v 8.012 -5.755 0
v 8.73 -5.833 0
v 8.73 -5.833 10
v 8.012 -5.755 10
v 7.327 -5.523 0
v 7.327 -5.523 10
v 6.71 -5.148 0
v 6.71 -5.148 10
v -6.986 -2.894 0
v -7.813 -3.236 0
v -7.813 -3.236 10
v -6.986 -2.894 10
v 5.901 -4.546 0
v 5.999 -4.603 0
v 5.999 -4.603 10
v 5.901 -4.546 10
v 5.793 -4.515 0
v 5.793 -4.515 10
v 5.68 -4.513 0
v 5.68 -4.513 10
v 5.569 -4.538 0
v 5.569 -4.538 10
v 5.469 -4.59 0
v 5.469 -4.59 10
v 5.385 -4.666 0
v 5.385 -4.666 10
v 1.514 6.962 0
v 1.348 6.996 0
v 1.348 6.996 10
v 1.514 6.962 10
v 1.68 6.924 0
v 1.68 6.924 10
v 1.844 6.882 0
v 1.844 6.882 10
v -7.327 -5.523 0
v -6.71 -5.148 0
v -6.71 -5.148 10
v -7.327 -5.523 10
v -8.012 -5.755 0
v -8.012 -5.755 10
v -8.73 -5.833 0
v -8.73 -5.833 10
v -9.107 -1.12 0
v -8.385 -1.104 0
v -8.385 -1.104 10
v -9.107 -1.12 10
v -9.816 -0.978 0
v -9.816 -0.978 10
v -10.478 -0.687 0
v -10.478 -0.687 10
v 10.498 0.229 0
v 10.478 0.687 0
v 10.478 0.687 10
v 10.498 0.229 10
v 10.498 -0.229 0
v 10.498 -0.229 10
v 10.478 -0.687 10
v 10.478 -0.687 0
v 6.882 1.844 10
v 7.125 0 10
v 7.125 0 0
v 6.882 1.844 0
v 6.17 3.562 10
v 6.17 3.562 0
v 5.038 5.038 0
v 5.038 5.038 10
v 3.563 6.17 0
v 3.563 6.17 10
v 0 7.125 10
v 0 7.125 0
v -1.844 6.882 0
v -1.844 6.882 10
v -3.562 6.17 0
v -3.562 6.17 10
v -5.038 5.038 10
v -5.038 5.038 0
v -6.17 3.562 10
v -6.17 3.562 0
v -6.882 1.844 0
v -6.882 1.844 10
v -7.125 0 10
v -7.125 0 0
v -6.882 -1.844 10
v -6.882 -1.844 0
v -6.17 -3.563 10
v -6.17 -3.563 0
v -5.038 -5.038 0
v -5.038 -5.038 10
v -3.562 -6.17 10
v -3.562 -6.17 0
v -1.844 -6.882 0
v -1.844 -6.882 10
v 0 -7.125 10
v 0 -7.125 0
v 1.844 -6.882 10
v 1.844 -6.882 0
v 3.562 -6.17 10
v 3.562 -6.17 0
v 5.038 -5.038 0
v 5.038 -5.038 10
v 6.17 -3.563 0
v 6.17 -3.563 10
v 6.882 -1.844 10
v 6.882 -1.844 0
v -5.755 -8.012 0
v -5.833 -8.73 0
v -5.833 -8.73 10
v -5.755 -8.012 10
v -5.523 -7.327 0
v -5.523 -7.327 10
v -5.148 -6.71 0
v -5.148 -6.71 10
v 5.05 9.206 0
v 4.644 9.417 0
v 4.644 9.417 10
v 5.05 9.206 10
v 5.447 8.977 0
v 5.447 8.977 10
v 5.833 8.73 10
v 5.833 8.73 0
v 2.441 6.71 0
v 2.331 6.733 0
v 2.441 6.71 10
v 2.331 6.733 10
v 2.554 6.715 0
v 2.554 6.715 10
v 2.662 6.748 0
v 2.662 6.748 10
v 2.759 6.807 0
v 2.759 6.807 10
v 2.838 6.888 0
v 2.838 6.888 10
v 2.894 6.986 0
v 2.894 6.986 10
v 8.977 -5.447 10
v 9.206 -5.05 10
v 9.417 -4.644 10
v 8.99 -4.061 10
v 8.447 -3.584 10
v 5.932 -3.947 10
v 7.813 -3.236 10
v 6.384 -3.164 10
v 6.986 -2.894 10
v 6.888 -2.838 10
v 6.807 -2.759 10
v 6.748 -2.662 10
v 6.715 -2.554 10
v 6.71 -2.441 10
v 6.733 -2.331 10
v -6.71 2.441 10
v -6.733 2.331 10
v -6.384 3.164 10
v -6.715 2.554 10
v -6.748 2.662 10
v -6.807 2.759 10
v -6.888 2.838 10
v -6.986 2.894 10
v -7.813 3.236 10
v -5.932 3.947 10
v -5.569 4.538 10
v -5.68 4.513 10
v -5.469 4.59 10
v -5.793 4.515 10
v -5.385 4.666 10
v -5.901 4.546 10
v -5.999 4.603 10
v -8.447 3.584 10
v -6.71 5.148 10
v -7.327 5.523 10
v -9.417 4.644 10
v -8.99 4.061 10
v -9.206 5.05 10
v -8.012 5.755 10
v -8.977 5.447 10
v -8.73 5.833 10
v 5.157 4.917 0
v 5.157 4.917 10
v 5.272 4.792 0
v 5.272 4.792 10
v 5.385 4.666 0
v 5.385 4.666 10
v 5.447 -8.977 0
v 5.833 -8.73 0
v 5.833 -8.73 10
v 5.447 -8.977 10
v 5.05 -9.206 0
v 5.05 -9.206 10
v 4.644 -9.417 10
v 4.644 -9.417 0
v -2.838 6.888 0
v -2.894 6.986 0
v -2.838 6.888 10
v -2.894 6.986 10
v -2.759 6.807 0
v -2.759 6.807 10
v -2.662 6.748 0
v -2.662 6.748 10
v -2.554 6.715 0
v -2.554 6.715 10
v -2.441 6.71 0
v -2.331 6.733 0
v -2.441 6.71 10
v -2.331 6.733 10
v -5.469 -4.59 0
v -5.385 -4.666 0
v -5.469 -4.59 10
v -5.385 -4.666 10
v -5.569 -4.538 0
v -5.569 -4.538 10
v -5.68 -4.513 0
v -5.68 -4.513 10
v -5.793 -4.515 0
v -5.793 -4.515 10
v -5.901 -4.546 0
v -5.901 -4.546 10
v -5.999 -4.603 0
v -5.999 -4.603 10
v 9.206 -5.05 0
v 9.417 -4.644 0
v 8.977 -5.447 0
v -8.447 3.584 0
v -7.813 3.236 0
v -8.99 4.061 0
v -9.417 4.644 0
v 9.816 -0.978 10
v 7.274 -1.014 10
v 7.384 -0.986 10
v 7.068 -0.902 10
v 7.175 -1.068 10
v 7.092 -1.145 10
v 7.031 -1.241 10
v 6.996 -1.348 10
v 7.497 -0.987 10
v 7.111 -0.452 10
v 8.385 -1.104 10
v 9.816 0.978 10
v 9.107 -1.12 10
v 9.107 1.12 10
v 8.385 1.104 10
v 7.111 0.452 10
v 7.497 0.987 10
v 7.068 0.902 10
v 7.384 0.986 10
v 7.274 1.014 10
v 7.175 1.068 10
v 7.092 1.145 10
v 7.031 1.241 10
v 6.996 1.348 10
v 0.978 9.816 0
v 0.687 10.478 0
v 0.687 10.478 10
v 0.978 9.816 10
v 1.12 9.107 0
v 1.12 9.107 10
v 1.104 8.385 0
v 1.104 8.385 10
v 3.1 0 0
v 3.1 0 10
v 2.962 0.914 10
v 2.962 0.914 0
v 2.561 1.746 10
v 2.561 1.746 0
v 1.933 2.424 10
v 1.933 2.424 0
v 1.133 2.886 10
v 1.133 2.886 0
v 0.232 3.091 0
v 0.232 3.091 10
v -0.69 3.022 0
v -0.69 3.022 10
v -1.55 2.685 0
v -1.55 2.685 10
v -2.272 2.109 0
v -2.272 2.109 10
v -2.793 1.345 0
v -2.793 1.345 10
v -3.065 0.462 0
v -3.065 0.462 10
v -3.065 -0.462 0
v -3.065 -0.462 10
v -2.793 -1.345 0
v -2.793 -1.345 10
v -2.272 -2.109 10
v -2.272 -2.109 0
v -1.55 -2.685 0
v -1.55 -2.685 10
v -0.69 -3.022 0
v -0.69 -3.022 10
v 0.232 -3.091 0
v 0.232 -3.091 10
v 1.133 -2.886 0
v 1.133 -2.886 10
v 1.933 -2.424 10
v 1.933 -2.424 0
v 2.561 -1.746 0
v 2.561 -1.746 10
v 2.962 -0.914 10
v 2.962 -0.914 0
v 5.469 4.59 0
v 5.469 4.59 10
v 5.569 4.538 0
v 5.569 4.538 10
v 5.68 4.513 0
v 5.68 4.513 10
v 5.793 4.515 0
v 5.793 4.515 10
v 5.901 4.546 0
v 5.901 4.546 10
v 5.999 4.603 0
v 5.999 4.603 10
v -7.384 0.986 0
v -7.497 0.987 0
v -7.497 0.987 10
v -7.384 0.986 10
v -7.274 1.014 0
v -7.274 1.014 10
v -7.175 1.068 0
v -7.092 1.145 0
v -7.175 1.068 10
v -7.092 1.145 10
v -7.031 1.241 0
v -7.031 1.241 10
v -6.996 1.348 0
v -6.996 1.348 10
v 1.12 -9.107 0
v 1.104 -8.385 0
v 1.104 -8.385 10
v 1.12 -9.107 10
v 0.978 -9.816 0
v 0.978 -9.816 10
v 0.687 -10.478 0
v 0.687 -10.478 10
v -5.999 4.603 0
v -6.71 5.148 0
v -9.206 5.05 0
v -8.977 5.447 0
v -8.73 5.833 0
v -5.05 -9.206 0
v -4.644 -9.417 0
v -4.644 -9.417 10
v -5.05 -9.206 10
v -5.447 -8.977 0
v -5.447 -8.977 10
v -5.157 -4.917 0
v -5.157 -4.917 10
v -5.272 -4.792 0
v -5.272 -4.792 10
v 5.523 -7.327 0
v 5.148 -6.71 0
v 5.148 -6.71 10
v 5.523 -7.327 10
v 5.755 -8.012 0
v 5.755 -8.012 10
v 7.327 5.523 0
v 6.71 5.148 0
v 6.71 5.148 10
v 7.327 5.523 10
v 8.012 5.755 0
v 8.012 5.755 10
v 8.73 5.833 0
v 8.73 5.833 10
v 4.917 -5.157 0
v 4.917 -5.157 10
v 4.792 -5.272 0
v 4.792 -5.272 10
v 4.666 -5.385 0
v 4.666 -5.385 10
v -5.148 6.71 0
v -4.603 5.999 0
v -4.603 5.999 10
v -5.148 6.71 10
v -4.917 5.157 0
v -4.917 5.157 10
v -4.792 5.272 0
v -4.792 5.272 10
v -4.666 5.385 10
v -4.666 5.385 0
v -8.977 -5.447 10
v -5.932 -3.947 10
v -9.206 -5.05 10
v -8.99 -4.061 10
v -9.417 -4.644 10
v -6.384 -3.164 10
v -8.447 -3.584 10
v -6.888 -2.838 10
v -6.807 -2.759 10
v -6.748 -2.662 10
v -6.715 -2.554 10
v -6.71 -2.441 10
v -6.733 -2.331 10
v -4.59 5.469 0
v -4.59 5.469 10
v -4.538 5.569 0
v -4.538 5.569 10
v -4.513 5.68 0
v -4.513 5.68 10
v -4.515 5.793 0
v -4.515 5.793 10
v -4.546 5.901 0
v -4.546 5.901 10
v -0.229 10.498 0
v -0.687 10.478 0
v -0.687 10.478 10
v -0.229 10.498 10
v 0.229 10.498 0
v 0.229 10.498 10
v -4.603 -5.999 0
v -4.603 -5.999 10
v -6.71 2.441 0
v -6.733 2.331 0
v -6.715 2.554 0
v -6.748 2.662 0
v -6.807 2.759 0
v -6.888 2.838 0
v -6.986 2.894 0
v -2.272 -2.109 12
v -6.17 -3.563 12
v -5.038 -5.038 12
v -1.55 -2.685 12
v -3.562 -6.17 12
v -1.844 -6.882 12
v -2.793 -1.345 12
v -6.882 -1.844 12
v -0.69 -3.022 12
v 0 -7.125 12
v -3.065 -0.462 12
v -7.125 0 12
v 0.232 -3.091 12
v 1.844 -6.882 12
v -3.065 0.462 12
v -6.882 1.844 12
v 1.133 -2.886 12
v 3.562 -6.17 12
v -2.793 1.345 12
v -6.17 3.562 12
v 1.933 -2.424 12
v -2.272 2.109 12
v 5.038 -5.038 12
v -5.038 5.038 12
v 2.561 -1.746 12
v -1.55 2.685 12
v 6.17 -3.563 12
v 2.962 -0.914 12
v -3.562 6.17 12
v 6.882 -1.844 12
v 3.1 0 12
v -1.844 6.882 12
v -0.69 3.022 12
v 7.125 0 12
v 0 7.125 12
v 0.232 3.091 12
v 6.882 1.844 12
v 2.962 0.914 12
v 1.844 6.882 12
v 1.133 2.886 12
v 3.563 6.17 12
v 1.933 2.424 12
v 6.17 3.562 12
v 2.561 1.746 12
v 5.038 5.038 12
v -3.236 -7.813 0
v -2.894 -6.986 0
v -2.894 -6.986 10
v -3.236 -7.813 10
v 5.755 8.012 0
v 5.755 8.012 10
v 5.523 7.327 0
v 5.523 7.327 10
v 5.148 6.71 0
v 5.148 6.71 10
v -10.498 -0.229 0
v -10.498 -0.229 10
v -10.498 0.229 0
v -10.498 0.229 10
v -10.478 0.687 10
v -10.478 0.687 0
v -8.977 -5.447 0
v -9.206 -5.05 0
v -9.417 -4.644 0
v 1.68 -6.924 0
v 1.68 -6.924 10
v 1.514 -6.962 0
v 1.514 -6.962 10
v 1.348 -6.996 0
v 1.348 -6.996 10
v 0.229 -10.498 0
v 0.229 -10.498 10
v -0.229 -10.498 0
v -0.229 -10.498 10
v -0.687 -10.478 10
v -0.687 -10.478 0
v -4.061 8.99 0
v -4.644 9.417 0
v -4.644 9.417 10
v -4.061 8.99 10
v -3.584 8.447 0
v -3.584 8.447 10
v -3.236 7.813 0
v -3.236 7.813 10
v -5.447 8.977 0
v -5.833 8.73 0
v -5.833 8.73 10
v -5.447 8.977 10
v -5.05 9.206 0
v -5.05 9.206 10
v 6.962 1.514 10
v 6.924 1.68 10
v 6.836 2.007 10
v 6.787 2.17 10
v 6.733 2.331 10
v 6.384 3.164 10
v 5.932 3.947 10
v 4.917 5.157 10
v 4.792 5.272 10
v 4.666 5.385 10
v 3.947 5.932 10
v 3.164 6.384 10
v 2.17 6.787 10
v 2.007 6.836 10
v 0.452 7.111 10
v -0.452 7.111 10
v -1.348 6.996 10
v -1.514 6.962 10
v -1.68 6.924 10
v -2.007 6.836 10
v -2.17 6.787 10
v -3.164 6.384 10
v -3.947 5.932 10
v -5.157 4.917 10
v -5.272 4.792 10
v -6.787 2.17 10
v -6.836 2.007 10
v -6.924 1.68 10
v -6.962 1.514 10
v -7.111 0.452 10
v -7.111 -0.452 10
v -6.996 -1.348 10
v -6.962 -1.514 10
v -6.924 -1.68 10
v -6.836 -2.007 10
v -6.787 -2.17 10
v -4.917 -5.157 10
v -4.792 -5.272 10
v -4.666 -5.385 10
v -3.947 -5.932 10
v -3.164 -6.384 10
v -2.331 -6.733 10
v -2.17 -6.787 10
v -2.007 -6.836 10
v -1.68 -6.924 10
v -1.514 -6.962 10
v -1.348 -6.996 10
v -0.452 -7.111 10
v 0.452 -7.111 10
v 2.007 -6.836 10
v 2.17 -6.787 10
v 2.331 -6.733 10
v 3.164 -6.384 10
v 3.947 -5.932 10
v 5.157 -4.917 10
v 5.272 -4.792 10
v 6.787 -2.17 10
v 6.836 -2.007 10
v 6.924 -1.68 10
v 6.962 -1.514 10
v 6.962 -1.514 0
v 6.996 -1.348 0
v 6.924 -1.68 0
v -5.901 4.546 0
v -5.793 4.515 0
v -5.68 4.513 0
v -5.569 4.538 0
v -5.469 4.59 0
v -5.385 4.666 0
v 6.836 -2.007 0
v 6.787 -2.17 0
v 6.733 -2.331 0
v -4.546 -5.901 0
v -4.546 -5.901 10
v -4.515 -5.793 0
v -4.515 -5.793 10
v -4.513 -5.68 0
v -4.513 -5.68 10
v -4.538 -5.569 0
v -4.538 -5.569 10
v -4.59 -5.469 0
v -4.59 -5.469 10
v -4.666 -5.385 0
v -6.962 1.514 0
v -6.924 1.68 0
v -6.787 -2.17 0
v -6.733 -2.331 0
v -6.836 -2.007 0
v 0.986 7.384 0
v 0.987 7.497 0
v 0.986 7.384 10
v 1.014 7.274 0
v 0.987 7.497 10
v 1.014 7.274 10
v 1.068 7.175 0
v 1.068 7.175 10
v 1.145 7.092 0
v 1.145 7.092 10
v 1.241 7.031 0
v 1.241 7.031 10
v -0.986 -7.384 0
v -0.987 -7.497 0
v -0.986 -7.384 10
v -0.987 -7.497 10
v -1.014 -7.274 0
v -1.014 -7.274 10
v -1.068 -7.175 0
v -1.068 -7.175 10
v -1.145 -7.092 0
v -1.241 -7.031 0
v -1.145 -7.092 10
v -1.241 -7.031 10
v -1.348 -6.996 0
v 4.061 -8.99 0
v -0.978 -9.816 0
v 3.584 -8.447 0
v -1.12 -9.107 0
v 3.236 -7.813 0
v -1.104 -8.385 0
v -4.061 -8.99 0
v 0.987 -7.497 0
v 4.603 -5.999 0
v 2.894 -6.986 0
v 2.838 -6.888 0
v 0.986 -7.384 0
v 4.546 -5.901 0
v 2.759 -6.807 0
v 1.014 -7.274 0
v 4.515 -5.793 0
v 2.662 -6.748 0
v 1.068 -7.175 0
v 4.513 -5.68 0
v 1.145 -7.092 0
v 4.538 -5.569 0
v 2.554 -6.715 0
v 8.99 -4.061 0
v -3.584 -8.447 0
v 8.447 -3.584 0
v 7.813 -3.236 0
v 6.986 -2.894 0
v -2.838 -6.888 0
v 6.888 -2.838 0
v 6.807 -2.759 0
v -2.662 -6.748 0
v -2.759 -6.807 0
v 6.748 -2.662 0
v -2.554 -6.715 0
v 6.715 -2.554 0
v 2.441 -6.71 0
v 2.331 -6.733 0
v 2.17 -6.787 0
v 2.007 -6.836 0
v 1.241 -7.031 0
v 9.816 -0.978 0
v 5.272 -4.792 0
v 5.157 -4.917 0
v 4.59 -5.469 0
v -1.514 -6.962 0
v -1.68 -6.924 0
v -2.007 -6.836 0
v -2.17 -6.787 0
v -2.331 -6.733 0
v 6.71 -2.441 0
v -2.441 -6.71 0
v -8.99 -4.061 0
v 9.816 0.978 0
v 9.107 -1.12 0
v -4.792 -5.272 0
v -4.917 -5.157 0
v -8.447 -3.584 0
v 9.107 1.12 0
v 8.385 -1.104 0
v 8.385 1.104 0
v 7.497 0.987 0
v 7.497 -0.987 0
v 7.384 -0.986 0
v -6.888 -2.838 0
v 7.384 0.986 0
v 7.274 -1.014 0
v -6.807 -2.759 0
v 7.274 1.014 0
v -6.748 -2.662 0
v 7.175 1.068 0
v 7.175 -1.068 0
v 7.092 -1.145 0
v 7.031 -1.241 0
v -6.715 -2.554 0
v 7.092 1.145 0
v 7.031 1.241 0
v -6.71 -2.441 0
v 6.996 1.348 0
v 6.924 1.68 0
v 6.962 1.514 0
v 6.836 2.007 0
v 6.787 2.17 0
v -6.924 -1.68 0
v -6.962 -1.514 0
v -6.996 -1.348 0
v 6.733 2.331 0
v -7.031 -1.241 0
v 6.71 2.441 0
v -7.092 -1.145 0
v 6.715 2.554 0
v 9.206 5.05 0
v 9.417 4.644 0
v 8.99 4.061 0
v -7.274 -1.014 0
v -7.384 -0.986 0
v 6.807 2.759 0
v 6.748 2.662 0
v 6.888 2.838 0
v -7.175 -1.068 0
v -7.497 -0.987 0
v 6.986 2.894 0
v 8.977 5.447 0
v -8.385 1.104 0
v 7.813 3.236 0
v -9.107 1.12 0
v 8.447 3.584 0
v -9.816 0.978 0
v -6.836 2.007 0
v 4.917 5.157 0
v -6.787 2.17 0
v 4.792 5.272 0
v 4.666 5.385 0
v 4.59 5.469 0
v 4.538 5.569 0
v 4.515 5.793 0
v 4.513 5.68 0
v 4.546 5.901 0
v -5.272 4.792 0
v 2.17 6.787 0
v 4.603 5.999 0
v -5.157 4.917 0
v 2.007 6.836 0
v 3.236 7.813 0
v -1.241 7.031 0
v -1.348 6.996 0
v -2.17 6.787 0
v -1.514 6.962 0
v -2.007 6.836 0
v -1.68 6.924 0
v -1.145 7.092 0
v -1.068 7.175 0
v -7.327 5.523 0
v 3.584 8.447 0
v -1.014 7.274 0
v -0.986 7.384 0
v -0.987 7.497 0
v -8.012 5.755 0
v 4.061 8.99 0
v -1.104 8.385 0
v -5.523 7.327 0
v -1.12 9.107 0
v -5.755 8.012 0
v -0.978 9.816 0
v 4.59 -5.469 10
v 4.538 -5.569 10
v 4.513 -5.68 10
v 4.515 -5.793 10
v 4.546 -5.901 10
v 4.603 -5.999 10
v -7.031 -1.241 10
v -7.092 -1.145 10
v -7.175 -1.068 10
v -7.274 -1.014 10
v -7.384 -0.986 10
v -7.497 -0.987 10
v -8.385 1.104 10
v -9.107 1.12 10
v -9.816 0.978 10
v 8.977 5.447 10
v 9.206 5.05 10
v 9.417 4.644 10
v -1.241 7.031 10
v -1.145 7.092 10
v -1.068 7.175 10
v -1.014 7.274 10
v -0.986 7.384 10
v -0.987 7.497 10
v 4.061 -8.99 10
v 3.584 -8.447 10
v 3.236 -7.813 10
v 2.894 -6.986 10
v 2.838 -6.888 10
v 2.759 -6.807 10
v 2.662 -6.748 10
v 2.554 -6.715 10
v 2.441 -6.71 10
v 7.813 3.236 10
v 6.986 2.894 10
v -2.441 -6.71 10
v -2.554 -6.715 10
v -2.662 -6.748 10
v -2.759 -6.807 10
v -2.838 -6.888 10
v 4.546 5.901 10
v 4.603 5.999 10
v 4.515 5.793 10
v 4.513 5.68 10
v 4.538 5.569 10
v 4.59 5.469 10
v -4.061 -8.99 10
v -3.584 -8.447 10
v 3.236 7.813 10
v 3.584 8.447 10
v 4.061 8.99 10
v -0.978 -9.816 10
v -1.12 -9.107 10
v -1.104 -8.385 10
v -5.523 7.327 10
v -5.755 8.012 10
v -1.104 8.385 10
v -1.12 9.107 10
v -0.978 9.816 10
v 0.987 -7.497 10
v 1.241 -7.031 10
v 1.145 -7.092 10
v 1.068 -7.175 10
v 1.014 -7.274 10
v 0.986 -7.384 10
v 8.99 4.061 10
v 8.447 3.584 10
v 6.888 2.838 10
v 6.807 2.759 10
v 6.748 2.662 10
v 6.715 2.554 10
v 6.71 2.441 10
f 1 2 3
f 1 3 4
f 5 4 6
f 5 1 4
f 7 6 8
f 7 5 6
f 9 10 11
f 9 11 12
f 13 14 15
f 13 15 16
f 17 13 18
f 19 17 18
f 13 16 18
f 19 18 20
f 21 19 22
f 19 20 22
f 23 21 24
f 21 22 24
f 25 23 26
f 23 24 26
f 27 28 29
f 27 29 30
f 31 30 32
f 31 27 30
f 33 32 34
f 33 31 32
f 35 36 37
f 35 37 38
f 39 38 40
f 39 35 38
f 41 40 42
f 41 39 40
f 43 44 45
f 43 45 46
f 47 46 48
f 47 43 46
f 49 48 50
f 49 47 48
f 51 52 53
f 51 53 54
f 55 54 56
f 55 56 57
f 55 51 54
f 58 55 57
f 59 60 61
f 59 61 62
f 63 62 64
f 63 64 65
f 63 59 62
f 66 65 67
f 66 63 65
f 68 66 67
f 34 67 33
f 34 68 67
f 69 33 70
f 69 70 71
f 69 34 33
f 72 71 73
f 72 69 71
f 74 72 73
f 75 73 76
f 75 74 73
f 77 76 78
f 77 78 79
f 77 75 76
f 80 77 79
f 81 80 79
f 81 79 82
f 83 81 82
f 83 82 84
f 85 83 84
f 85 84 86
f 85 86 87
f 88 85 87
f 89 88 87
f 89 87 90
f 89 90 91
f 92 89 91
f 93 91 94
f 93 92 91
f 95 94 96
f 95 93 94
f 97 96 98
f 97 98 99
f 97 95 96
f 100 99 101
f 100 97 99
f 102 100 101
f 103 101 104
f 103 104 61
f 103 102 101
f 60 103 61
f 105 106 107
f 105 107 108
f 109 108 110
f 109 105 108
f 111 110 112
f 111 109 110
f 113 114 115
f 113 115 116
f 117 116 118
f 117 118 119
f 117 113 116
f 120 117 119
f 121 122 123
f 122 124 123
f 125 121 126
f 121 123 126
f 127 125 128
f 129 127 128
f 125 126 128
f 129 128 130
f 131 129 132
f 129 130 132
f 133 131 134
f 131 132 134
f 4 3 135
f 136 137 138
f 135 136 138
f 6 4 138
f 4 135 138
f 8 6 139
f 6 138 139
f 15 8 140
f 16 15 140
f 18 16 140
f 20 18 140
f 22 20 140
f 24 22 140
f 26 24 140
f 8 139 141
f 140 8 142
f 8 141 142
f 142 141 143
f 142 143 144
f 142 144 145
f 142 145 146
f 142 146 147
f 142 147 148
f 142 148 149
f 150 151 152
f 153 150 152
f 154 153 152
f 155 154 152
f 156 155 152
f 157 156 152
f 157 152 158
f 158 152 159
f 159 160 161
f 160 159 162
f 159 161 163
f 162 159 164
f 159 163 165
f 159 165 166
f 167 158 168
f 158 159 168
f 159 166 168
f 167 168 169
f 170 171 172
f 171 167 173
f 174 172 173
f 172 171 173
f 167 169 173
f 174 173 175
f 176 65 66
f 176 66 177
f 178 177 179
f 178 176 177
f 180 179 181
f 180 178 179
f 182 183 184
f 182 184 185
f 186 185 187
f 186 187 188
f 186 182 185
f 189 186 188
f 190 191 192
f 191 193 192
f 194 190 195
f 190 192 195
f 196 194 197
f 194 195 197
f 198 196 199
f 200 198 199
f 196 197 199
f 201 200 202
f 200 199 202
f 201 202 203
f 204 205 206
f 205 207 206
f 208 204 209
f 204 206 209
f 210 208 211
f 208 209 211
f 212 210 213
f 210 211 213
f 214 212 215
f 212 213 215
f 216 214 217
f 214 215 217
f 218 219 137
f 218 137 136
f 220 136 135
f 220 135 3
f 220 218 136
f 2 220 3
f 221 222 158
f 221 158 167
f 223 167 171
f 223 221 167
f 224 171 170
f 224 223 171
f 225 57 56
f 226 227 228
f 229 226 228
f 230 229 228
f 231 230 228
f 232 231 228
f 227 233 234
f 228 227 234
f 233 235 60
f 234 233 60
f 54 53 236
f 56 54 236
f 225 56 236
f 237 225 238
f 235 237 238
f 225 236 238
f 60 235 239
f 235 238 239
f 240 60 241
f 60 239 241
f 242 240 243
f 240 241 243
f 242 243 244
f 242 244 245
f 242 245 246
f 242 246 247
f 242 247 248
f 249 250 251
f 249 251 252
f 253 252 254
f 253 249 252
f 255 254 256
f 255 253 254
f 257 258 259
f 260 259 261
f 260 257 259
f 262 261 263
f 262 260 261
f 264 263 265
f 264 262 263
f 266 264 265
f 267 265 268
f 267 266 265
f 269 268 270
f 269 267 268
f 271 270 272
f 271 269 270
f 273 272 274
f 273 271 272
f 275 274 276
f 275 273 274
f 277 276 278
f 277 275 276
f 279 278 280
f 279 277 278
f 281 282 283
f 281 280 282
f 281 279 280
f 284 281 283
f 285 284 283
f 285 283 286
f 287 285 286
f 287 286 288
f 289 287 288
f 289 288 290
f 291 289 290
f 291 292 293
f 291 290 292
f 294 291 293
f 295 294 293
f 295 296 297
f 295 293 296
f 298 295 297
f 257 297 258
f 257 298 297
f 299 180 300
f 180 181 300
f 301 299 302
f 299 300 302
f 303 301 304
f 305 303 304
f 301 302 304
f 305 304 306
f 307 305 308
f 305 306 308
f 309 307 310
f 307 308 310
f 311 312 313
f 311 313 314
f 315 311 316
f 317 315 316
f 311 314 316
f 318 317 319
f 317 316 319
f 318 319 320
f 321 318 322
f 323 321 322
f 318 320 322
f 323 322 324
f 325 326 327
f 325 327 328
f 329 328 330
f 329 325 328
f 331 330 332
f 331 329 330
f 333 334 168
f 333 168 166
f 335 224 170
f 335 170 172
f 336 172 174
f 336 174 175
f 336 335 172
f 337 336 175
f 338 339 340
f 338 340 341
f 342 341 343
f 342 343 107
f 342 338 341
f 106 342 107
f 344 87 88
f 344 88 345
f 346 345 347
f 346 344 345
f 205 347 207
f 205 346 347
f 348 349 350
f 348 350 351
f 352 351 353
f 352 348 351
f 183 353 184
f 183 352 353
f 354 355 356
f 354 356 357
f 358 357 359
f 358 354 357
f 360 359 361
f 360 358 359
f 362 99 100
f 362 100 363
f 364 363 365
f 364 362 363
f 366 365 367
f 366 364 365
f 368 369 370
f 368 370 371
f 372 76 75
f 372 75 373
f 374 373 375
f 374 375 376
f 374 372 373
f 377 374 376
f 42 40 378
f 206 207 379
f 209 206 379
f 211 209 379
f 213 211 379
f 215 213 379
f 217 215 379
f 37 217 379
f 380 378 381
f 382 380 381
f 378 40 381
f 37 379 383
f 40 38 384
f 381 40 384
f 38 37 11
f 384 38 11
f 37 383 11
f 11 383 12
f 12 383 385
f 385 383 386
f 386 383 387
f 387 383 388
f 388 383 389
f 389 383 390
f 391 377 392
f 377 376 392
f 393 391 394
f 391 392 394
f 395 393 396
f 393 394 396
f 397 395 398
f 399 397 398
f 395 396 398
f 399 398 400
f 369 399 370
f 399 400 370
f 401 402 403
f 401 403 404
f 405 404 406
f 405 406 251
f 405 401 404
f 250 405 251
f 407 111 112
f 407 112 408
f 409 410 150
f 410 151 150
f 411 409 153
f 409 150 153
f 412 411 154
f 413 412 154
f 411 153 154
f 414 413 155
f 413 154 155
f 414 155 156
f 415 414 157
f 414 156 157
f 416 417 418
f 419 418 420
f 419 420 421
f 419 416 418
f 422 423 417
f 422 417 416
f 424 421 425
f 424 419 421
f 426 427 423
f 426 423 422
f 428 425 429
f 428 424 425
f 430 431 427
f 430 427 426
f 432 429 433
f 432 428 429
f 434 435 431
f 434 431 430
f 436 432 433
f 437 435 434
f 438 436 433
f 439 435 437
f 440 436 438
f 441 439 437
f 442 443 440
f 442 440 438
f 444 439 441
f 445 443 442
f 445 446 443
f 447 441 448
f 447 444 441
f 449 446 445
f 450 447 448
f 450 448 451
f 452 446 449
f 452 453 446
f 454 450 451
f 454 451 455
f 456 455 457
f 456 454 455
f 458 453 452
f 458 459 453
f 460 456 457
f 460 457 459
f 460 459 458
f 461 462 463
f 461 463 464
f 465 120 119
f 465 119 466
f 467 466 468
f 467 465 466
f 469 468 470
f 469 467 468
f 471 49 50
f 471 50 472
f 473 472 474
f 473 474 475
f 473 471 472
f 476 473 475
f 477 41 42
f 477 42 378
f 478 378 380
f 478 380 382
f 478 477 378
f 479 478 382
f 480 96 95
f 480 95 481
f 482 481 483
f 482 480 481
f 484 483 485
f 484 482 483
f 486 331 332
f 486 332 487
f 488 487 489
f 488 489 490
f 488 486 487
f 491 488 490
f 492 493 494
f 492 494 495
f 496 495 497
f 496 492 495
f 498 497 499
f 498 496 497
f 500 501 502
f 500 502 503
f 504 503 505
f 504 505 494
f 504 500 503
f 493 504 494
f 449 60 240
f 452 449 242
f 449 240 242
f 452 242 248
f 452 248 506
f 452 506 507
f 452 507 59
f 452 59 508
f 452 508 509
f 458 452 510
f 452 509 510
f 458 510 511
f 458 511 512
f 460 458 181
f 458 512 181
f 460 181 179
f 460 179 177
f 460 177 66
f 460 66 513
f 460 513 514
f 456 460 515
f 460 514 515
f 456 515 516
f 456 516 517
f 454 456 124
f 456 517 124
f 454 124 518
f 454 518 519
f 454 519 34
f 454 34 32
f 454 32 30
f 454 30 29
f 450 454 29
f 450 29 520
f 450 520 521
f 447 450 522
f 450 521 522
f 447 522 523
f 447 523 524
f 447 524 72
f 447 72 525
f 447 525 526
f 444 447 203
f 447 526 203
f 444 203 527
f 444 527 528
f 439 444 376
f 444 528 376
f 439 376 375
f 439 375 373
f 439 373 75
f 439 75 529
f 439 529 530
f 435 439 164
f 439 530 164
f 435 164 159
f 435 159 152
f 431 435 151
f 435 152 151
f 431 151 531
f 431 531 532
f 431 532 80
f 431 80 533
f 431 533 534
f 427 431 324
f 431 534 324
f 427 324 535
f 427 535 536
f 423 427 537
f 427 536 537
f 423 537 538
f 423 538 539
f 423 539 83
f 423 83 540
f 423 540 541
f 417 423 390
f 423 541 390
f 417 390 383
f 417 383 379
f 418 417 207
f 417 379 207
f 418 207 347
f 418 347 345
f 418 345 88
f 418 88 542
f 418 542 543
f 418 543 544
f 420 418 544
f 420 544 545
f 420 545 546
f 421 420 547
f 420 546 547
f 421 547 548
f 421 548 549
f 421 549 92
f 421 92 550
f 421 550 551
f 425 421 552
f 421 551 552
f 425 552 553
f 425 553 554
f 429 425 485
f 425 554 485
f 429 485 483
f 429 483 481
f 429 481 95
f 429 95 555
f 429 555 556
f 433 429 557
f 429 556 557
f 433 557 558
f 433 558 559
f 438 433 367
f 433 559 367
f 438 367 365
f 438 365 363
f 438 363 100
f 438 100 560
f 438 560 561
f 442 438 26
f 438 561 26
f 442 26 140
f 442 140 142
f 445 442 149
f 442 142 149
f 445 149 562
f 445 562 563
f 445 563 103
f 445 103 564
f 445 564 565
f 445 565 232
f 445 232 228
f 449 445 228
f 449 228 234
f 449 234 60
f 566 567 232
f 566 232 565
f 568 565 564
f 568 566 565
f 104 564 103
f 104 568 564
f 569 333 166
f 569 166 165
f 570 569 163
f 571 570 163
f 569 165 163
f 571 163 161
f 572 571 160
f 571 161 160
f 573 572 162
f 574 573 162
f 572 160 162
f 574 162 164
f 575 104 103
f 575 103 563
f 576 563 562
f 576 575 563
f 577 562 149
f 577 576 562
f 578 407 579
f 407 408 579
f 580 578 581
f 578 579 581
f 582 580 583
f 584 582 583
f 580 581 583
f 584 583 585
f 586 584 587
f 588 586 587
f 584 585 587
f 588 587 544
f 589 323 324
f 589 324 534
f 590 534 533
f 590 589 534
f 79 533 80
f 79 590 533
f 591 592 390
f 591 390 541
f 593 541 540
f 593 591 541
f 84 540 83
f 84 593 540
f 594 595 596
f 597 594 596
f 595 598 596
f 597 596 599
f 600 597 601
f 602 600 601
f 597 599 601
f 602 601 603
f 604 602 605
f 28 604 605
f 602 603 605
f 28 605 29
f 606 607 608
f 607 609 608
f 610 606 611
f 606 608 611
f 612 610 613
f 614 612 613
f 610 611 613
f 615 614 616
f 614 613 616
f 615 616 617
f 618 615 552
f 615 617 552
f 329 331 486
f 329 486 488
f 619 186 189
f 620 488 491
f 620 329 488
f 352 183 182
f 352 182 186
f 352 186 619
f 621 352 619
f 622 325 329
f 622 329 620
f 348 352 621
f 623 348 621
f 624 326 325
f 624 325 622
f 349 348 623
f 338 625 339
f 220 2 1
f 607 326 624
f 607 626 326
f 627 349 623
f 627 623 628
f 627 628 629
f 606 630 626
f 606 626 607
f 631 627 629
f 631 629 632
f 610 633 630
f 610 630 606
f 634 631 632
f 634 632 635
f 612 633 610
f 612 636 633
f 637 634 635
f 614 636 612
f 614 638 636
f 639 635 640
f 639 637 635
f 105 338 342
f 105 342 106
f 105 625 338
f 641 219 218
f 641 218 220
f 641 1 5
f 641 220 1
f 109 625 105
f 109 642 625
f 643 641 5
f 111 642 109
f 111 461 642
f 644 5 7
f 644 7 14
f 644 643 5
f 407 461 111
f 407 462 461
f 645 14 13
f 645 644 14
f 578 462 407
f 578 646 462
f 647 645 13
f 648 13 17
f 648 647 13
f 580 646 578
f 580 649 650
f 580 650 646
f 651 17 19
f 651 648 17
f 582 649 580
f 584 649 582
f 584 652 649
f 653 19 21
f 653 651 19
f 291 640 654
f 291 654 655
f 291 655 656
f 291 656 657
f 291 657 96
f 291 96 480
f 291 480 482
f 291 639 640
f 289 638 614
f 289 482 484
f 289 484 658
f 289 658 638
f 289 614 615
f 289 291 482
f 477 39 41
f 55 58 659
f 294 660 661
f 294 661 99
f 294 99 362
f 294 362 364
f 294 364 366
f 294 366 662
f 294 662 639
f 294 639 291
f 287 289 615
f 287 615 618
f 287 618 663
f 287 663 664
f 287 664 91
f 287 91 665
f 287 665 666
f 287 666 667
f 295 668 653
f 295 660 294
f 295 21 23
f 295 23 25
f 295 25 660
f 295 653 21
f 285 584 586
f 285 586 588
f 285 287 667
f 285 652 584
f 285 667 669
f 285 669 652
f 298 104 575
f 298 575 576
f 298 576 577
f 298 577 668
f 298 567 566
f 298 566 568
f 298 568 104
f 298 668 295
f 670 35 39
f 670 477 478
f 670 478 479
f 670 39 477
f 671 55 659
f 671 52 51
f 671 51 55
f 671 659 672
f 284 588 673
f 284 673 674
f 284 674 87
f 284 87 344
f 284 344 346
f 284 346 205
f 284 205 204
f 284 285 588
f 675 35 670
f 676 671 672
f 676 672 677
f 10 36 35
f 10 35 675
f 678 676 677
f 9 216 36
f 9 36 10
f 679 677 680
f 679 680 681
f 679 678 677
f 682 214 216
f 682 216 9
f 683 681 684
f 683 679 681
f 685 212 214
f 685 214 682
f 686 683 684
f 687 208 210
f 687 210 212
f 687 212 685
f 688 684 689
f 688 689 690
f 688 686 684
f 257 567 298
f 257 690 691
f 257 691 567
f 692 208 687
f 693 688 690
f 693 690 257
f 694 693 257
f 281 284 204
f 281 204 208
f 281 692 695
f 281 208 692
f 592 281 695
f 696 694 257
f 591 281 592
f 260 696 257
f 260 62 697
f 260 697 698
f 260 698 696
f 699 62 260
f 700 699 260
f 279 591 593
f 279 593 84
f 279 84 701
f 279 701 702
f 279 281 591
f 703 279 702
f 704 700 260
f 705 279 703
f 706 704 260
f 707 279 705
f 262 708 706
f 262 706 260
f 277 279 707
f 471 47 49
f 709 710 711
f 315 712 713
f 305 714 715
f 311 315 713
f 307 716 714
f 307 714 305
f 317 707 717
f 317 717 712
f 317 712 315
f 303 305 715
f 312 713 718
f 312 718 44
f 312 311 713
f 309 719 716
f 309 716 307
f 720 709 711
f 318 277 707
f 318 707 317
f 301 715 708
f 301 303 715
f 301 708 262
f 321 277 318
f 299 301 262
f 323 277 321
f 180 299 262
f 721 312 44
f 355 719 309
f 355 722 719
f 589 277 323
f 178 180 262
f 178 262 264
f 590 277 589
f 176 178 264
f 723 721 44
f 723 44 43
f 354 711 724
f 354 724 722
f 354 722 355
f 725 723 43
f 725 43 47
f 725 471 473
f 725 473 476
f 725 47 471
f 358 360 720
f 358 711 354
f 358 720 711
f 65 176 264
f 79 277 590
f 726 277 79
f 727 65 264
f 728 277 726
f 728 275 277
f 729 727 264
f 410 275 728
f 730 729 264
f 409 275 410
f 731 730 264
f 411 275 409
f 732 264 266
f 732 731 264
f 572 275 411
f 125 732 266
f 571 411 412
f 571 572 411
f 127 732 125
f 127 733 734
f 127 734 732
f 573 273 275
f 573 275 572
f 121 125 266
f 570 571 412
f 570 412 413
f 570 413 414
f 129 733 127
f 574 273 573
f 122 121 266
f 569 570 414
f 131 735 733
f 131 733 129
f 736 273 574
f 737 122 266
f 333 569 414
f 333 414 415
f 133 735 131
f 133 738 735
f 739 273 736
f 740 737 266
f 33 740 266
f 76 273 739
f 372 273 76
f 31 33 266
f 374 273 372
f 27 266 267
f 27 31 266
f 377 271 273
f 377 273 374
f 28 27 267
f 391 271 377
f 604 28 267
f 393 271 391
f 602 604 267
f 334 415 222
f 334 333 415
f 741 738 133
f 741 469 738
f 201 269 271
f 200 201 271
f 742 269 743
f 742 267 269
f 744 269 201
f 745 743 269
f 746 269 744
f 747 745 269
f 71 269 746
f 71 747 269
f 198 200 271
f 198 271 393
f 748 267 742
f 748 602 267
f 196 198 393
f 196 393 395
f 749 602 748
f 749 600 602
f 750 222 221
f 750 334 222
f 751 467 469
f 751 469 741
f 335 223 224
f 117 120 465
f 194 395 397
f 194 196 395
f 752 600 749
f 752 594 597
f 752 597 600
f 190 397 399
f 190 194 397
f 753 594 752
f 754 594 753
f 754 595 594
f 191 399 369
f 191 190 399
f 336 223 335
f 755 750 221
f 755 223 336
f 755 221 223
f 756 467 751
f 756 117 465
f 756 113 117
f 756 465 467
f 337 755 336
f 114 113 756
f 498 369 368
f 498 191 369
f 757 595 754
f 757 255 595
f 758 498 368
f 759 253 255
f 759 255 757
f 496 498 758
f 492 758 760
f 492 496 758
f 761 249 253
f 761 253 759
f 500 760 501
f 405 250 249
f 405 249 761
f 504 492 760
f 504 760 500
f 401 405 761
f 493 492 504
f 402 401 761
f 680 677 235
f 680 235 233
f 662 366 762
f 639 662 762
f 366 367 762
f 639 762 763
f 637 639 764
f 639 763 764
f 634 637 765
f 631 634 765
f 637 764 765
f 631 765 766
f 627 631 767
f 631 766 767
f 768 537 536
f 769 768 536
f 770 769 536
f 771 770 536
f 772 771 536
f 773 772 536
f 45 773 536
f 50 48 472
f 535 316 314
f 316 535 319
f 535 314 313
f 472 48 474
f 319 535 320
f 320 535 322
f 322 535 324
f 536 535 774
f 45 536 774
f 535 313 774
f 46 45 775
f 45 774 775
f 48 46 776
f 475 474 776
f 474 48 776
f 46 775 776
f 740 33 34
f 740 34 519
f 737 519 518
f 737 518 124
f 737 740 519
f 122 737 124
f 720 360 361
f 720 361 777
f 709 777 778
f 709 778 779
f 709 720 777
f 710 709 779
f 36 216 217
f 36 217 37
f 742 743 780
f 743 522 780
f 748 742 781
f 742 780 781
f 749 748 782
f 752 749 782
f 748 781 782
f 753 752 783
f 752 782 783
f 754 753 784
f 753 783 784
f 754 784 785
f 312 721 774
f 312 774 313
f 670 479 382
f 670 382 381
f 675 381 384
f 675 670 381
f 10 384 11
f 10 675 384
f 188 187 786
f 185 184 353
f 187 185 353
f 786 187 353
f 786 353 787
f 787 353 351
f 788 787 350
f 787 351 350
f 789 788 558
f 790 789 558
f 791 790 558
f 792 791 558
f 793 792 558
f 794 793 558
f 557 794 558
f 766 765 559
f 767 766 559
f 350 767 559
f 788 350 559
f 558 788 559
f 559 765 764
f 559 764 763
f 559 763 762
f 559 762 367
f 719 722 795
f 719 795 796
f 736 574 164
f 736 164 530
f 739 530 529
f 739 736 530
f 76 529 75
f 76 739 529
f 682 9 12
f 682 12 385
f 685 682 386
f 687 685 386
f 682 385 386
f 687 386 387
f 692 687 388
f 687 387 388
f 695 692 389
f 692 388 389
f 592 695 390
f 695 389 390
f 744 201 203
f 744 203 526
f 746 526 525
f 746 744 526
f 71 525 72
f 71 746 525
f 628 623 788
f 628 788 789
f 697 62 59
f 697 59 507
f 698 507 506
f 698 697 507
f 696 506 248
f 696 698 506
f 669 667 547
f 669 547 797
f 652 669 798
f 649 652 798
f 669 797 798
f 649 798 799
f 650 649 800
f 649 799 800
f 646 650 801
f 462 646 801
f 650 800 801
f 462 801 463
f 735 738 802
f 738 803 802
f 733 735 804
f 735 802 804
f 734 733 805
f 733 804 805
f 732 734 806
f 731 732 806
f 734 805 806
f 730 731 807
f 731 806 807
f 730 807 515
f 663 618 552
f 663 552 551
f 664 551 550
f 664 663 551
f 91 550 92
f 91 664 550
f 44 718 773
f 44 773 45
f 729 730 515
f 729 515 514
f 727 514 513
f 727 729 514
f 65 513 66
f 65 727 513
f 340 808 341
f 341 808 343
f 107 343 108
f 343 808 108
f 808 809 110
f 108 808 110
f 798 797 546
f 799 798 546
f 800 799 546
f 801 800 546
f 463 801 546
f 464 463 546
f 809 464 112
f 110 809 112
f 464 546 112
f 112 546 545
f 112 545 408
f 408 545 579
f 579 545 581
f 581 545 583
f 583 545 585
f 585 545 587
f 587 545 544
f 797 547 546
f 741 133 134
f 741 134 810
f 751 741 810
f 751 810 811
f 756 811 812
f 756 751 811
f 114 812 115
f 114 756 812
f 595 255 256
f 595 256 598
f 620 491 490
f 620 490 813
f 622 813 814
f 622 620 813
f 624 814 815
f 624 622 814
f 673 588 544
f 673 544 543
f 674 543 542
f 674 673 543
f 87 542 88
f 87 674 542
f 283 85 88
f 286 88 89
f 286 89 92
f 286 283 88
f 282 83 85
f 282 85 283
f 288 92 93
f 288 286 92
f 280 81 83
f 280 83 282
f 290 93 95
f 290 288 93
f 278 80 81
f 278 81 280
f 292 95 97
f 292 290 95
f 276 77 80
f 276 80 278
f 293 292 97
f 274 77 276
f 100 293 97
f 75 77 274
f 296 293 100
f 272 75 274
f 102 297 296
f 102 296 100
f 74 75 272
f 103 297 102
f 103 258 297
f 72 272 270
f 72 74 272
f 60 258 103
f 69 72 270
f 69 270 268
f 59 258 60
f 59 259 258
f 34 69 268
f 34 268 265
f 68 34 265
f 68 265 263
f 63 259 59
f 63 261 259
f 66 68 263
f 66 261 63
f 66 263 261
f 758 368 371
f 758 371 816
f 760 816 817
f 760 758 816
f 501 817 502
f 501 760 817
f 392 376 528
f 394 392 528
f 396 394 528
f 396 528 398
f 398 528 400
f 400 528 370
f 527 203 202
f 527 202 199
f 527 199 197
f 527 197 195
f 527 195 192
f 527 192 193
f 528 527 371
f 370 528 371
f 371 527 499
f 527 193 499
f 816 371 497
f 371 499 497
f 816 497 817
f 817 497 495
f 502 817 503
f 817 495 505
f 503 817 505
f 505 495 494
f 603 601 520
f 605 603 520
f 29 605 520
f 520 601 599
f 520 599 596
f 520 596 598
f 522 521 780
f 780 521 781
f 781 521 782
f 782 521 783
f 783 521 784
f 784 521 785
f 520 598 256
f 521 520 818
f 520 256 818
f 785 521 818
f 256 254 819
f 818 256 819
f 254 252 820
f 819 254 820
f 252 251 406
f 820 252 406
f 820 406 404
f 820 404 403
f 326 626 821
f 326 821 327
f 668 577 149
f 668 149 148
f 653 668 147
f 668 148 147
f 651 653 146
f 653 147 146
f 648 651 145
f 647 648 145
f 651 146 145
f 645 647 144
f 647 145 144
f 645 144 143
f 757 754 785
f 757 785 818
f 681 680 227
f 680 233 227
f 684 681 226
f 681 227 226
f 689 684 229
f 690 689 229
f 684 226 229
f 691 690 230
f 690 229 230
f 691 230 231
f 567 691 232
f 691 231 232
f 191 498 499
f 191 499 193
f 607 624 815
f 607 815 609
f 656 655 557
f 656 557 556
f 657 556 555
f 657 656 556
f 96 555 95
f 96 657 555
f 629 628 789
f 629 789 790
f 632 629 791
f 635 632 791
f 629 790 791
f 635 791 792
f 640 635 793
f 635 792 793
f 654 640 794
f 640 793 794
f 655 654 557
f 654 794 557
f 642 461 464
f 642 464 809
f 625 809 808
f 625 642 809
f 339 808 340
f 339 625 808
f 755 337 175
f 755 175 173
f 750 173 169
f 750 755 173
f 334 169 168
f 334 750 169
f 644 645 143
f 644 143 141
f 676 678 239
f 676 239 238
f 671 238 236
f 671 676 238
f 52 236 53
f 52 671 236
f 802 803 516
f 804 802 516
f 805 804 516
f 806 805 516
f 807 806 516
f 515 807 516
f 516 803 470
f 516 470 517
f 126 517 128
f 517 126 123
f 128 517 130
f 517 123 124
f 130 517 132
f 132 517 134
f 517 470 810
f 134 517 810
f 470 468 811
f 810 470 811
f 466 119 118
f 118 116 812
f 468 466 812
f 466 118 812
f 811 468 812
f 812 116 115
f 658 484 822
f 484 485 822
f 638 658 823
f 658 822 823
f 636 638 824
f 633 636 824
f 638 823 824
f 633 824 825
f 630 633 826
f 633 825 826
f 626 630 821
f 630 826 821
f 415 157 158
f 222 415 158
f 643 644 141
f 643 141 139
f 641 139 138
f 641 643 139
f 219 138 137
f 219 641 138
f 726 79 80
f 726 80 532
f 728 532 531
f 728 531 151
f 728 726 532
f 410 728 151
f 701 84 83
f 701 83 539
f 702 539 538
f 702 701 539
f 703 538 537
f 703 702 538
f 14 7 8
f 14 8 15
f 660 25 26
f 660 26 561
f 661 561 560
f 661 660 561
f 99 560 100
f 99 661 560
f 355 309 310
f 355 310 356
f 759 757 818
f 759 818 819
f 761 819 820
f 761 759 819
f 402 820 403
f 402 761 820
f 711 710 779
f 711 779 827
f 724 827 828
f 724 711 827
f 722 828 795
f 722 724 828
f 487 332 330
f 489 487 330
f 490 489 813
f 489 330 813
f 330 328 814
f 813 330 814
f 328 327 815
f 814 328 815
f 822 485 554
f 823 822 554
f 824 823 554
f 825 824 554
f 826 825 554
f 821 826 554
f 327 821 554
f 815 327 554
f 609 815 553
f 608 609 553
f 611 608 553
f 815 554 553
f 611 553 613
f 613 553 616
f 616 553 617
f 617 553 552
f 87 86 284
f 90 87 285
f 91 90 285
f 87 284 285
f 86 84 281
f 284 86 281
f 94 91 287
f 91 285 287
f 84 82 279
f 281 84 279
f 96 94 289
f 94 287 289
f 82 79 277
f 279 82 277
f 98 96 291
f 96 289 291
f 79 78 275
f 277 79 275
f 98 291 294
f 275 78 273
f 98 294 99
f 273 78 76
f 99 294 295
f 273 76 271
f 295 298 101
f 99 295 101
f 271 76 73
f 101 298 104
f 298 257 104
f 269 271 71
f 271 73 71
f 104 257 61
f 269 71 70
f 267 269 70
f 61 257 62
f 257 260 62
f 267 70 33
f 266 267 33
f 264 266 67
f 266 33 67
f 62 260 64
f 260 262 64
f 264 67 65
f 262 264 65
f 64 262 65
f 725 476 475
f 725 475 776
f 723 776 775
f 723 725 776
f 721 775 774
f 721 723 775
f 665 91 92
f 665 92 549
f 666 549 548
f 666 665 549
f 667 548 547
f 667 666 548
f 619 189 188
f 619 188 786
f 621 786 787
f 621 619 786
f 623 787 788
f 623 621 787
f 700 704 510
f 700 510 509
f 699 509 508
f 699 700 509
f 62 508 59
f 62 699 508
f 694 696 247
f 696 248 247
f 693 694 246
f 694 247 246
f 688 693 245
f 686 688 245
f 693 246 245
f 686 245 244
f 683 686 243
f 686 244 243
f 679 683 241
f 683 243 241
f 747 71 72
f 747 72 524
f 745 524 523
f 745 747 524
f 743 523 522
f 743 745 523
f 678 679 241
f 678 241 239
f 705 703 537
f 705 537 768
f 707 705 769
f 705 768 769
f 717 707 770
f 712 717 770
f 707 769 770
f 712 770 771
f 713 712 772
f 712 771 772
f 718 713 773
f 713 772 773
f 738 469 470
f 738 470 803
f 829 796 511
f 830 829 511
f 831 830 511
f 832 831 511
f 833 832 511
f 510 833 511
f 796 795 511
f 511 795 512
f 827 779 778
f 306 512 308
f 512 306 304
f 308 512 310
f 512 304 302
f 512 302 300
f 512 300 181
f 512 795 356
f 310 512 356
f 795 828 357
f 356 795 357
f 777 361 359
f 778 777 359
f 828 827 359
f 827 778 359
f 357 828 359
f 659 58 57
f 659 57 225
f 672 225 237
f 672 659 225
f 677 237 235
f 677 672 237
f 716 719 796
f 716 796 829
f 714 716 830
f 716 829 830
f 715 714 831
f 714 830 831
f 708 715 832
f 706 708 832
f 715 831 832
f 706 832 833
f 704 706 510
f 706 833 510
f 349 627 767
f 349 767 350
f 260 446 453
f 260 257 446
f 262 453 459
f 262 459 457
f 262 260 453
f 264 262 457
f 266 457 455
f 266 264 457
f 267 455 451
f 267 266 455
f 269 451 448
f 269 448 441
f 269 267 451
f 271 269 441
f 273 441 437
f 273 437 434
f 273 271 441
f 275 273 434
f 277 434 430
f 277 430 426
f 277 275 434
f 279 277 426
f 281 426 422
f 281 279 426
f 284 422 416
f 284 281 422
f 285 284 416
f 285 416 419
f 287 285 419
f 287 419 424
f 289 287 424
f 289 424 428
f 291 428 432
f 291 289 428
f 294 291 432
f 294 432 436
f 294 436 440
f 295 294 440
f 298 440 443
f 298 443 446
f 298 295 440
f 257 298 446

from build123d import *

# Parameters (mm, degrees)
MAINGEAR_DEPTH                     = 10
CONG_1_R                           = 0.45
R_P_TITION_CIRCULAIRE1_COUNT       = 12
CONG_1_OF_R_P_TITION_CIRCULAIRE1_R = 0.45
ESQUISSE5_R                        = 7.125
MAINBASECIRCLE_DEPTH               = 10
ESQUISSE9_R                        = 7.125
ESQUISSE9_R_2                      = 3.1
GEARBOTTOMFIX_DEPTH                = 2
ESQUISSE3_R                        = 3.1
GEARHOLE_DEPTH                     = 13


with BuildPart() as part:
    # Esquisse1 → MainGear (new body)
    with BuildSketch(Plane.XY):
        with BuildLine():
            Line((0, 0), (6.882221512, 1.844085696))
            ThreePointArc((6.882221512, 1.844085696), (6.988095123, 1.390018544), (7.064044637, 0.92999912))
            Line((7.064044637, 0.92999912), (8.384880781, 1.103890497))
            ThreePointArc((8.384880781, 1.103890497), (9.465680859, 1.068283463), (10.477518694, 0.686732857))
            ThreePointArc((10.477518694, 0.686732857), (10.5, 0), (10.477518694, -0.686732857))
            ThreePointArc((10.477518694, -0.686732857), (9.465680859, -1.068283463), (8.384880781, -1.103890497))
            Line((8.384880781, -1.103890497), (7.064044637, -0.92999912))
            ThreePointArc((7.064044637, -0.92999912), (6.988095123, -1.390018544), (6.882221512, -1.844085696))
            Line((6.882221512, -1.844085696), (0, 0))
        make_face()
    maingear = extrude(amount=MAINGEAR_DEPTH)

    # Congé1
    cong_1_edges = [part.edges().sort_by_distance(p)[0] for p in [
        (7.064044637, 0.92999912, 5),
        (7.064044637, -0.92999912, 5),
    ]]
    fillet(cong_1_edges, radius=CONG_1_R)

    # Répétition circulaire1: MainGear ×12 about axis
    r_p_tition_circulaire1_axis = Axis((0, 0, 0), (0, 0, 1))
    for i in range(1, R_P_TITION_CIRCULAIRE1_COUNT):
        add(maingear.rotate(r_p_tition_circulaire1_axis, i * 360 / R_P_TITION_CIRCULAIRE1_COUNT))

    # Congé1 of Répétition circulaire1
    cong_1_of_r_p_tition_circulaire1_edges = [part.edges().sort_by_distance(p)[0] for p in [
        (5.65264255, 4.337425182, 5),
        (6.582641669, 2.726619456, 5),
        (2.726619456, 6.582641669, 5),
        (4.337425182, 5.65264255, 5),
        (-0.92999912, 7.064044637, 5),
        (0.92999912, 7.064044637, 5),
        (-4.337425182, 5.65264255, 5),
        (-2.726619456, 6.582641669, 5),
        (-6.582641669, 2.726619456, 5),
        (-5.65264255, 4.337425182, 5),
        (-7.064044637, -0.92999912, 5),
        (-7.064044637, 0.92999912, 5),
        (-5.65264255, -4.337425182, 5),
        (-6.582641669, -2.726619456, 5),
        (-2.726619456, -6.582641669, 5),
        (-4.337425182, -5.65264255, 5),
        (0.92999912, -7.064044637, 5),
        (-0.92999912, -7.064044637, 5),
        (4.337425182, -5.65264255, 5),
        (2.726619456, -6.582641669, 5),
        (6.582641669, -2.726619456, 5),
        (5.65264255, -4.337425182, 5),
    ]]
    fillet(cong_1_of_r_p_tition_circulaire1_edges, radius=CONG_1_OF_R_P_TITION_CIRCULAIRE1_R)

    # Esquisse9 → GearBottomFix (add)
    with BuildSketch(Plane.XY.offset(10)):
        Circle(ESQUISSE9_R)
        Circle(ESQUISSE9_R_2, mode=Mode.SUBTRACT)
    extrude(amount=GEARBOTTOMFIX_DEPTH)


with BuildPart() as body_2:
    # Esquisse5 → MainBaseCircle (new body, through all)
    with BuildSketch(Plane.XY.offset(10)):
        Circle(ESQUISSE5_R)
    extrude(amount=-MAINBASECIRCLE_DEPTH)


with BuildPart() as gearhole_tool:
    # Esquisse3 → GearHole (new body, through all)
    with BuildSketch(Plane.XY):
        Circle(ESQUISSE3_R)
    extrude(amount=GEARHOLE_DEPTH)


with BuildPart() as part_1:
    add(part.part)

    # GearHole: cut by gearhole_tool
    add(gearhole_tool.part, mode=Mode.SUBTRACT)


with BuildPart() as body_2_1:
    add(body_2.part)

    # GearHole: cut by gearhole_tool
    add(gearhole_tool.part, mode=Mode.SUBTRACT)


solid = Compound([part_1.part, body_2_1.part])
